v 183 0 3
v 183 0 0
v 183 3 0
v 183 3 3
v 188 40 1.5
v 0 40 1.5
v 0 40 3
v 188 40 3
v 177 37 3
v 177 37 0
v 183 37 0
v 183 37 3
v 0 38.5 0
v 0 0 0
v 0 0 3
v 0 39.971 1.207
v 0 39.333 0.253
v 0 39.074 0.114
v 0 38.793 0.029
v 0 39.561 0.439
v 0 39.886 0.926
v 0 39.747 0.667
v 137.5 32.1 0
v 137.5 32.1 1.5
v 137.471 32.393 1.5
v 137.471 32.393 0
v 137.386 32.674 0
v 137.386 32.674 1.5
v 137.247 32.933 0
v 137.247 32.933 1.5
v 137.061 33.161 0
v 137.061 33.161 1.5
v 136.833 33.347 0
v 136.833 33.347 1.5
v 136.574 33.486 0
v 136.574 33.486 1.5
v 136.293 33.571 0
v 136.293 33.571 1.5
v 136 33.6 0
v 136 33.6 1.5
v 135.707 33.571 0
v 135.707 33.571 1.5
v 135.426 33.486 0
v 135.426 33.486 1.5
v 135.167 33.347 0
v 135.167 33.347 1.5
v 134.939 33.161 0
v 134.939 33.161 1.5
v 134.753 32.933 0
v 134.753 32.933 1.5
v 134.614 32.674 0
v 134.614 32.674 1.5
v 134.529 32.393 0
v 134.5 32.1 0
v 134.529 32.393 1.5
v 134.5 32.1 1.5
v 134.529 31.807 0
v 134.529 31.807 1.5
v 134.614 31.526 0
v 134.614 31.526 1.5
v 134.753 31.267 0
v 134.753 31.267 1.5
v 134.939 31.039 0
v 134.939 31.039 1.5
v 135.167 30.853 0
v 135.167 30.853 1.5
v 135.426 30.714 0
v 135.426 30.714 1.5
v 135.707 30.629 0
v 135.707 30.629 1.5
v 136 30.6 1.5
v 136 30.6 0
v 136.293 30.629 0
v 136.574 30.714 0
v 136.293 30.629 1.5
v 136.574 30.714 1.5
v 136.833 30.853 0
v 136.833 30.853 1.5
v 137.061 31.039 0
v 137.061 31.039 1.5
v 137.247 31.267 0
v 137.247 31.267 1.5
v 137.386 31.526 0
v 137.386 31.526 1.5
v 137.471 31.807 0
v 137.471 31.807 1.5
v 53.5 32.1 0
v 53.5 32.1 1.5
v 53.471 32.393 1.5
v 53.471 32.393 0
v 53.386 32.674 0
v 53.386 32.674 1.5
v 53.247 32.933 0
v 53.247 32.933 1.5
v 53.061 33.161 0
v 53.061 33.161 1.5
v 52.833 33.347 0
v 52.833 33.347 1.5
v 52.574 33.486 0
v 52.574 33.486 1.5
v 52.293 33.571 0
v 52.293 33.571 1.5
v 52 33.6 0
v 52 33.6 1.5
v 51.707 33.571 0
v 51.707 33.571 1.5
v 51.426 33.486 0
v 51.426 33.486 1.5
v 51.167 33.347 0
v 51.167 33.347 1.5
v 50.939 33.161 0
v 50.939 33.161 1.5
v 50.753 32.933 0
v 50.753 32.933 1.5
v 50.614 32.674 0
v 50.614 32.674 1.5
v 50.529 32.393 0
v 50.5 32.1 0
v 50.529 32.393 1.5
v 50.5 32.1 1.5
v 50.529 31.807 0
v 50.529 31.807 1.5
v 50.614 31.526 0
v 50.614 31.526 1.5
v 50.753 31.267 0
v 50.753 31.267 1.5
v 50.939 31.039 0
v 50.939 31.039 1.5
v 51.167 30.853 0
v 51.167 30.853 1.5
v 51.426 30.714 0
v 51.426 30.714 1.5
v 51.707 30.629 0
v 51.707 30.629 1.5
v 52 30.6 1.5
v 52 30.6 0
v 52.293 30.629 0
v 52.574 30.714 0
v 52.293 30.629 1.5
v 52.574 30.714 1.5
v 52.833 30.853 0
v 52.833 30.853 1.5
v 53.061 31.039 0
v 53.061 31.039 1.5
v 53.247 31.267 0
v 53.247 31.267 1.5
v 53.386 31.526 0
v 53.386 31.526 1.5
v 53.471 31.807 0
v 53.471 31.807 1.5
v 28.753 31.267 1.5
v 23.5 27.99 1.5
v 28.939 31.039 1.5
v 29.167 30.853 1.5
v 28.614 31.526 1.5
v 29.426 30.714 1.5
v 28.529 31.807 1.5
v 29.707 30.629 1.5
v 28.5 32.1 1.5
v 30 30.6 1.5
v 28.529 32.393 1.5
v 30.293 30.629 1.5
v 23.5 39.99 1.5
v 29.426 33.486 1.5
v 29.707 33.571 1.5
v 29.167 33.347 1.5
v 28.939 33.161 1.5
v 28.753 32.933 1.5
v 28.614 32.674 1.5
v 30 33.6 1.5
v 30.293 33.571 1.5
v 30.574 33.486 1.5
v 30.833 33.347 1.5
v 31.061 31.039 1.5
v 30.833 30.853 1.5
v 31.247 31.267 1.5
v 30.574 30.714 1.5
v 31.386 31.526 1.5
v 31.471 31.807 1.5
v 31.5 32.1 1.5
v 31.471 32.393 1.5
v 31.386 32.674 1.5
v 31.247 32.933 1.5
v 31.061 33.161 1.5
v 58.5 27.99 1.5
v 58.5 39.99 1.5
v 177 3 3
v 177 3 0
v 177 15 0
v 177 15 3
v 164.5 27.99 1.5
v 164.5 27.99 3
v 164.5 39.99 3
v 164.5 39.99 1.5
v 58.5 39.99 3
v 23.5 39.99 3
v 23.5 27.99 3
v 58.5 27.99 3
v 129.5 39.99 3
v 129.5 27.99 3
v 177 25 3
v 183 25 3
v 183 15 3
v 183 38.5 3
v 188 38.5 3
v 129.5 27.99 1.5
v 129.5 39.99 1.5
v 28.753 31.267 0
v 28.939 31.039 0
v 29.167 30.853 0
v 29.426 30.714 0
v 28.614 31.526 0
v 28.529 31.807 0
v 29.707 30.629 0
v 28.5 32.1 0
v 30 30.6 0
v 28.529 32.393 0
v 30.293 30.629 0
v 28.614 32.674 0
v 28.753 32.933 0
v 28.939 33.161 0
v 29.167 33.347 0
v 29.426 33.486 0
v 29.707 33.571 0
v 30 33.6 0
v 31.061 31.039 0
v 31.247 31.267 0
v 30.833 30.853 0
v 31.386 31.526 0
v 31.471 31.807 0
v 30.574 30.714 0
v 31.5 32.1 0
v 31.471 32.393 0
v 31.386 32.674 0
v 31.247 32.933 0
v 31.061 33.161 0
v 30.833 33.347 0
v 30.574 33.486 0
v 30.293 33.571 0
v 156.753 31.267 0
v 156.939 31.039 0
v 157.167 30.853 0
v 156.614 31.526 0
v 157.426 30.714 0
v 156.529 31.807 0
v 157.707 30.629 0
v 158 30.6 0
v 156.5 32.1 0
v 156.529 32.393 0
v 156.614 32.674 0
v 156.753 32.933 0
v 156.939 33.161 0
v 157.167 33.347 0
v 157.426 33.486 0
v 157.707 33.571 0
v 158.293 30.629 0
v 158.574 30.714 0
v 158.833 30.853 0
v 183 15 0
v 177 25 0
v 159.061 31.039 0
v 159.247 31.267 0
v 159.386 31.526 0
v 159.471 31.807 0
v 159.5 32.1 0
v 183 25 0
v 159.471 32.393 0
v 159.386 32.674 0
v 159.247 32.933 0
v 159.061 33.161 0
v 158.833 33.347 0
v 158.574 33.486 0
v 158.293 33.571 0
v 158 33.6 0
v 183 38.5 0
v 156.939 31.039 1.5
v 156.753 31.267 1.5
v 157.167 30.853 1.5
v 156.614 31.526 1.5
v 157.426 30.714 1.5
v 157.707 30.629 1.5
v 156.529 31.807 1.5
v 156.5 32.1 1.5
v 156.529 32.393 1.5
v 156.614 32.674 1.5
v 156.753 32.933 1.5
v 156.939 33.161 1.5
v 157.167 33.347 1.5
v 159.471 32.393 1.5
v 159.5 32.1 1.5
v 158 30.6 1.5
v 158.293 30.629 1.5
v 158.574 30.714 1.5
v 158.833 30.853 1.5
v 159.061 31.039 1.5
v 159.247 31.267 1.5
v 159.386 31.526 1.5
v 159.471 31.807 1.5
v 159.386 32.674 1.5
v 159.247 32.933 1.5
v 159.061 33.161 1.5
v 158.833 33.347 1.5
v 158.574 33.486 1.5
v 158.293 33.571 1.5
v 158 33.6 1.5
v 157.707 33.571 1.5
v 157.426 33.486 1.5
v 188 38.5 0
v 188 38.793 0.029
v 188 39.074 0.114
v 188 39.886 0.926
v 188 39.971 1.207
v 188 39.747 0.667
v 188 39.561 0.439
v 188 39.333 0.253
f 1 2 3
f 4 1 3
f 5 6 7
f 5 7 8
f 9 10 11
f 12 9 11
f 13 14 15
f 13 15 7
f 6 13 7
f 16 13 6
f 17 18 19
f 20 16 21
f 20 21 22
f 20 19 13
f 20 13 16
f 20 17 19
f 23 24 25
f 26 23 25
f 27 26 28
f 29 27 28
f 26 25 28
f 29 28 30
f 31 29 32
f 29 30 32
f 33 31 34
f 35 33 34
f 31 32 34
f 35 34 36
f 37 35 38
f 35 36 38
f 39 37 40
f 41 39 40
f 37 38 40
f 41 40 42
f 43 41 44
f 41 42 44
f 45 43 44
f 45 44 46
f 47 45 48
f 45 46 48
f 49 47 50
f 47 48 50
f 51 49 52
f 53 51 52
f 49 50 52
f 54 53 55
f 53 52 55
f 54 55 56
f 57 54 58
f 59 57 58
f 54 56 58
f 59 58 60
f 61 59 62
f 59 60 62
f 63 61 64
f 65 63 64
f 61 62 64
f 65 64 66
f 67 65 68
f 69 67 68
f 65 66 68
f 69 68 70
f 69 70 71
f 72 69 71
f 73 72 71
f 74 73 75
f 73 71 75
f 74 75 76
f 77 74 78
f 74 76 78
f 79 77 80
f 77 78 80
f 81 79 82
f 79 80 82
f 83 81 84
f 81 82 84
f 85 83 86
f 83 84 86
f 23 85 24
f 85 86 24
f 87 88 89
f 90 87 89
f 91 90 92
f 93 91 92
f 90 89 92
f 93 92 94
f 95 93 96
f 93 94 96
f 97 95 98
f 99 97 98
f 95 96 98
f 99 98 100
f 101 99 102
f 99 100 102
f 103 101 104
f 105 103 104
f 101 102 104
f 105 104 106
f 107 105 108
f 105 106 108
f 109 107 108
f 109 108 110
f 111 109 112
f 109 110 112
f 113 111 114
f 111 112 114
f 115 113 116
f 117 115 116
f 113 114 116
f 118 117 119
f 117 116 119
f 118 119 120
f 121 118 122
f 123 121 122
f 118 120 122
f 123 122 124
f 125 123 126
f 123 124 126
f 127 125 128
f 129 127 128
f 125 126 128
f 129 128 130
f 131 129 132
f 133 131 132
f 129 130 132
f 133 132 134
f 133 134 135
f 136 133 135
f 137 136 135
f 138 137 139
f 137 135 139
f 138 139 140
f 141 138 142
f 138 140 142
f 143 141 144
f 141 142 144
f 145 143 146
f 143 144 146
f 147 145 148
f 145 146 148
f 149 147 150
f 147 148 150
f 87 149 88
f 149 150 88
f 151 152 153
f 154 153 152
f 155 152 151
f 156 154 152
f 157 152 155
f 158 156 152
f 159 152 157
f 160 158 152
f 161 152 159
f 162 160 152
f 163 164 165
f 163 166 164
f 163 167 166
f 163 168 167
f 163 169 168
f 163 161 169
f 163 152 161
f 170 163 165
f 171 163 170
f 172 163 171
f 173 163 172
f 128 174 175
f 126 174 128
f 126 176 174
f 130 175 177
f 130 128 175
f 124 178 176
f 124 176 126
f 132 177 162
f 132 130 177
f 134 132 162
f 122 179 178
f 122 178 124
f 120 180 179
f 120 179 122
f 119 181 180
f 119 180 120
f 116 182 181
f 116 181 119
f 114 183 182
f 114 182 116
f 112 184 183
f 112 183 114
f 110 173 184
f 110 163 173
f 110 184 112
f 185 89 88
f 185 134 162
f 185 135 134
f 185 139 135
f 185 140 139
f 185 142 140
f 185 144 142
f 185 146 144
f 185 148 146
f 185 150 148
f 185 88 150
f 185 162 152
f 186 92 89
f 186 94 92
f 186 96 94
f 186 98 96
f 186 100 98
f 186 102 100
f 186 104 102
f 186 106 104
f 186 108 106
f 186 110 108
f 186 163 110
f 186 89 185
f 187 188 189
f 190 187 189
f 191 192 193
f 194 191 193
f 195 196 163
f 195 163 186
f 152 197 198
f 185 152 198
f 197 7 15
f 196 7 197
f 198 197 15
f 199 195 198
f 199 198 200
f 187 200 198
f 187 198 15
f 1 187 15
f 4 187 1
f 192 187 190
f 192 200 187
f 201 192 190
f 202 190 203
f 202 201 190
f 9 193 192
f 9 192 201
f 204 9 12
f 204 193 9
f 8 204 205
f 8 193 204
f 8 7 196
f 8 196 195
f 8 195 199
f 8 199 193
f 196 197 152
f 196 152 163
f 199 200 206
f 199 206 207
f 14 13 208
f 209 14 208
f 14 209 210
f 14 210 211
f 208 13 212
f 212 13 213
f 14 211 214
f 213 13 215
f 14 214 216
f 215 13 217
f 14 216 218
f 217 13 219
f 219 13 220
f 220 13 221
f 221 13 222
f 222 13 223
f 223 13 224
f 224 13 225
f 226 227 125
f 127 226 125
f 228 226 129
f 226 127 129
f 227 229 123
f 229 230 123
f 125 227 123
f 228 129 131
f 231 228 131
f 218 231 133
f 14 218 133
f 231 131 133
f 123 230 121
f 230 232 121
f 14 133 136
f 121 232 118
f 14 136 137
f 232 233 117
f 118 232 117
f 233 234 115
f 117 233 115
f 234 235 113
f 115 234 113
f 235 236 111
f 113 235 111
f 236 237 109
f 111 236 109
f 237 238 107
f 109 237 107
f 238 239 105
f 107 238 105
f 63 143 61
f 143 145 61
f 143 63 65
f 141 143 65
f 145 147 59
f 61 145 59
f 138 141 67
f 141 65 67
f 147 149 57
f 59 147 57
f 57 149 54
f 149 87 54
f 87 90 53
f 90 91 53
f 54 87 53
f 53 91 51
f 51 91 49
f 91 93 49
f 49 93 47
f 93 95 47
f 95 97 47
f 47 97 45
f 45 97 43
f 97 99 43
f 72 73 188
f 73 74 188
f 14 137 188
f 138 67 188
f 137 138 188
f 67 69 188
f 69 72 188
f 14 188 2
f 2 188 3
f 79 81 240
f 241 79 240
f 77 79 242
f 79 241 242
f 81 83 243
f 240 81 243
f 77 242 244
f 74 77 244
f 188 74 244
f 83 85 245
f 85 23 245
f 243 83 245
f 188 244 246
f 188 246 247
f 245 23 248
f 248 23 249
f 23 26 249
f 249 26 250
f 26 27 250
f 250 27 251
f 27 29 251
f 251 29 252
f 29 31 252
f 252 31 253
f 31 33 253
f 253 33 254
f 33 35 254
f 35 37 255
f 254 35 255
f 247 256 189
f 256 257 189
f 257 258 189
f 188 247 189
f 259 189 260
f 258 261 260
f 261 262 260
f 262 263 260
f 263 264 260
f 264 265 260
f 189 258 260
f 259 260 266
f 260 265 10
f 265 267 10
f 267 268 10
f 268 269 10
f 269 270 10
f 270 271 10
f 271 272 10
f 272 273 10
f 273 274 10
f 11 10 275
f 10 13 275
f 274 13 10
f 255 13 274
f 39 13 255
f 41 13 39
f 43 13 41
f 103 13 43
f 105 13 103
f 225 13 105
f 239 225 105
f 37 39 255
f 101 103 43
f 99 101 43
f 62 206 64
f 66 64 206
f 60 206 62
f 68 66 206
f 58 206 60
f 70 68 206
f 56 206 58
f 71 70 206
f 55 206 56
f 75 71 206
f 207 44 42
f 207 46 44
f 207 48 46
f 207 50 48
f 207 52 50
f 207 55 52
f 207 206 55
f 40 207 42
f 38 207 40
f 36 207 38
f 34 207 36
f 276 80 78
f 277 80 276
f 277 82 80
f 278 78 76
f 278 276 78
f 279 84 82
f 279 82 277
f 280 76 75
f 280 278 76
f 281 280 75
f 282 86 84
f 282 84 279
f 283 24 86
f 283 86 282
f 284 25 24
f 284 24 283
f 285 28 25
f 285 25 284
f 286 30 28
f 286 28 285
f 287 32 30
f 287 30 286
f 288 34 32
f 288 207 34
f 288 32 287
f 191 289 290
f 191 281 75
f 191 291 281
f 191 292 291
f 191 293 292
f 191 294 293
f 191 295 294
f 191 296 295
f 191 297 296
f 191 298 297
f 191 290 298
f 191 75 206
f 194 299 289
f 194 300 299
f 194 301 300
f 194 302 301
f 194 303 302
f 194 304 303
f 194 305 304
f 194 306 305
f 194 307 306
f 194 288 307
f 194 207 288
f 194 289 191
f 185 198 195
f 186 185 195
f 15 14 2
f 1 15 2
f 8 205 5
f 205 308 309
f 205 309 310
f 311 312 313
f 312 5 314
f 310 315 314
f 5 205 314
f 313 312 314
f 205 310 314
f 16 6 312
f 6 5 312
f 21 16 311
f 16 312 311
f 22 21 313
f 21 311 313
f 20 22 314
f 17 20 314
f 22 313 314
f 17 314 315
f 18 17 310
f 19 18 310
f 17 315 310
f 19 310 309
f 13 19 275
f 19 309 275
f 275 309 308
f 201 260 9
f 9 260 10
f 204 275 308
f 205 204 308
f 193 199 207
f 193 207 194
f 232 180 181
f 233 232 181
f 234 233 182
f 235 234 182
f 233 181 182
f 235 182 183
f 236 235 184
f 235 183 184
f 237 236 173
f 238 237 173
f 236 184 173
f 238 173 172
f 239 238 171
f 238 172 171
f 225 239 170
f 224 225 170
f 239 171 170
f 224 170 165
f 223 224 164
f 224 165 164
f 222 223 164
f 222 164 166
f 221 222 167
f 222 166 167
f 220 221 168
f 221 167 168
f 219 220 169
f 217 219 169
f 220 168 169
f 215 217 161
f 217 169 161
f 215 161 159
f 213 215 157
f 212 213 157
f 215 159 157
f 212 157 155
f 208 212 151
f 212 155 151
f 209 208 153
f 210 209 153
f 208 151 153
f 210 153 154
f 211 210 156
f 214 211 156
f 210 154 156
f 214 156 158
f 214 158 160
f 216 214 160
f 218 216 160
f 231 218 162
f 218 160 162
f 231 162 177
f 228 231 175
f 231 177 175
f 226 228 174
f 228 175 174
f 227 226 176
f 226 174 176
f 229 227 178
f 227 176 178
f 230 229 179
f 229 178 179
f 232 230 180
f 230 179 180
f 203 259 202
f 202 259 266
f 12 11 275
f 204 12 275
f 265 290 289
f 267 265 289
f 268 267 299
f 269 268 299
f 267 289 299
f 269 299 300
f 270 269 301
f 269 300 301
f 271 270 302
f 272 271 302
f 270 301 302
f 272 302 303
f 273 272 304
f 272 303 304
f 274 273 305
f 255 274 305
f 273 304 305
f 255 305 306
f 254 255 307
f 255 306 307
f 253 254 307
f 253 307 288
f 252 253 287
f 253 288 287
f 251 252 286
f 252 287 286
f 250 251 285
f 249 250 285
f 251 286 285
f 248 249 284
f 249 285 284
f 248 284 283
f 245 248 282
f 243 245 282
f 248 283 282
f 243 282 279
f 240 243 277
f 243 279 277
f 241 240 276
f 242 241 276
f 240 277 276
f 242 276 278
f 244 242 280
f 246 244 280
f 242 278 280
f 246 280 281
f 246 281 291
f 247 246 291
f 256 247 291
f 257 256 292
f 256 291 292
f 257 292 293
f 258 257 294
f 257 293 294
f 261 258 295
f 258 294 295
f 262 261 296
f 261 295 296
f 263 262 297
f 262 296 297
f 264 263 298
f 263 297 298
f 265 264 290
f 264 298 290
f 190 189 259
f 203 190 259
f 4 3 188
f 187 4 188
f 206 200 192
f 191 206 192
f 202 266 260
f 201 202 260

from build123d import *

# Parameters (mm, degrees)
ESQUISSE1_W             = 188
ESQUISSE1_H             = 40
BOSS_EXTRU_1_DEPTH      = 3
CONG_3_R                = 1.5
ENL_V_MAT_EXTRU_1_DEPTH = 193.231631112
ESQUISSE5_W             = 35
ESQUISSE5_H             = 12
ENL_V_MAT_EXTRU_2_DEPTH = 1.5
ESQUISSE7_R             = 1.5
ENL_V_MAT_EXTRU_3_DEPTH = 1.5
ESQUISSE8_R             = 1.5
ENL_V_MAT_EXTRU_4_DEPTH = 1.5


with BuildPart() as part:
    # Esquisse1 → Boss.-Extru.1 (new body)
    with BuildSketch(Plane.XY):
        with Locations((94, 20)):
            Rectangle(ESQUISSE1_W, ESQUISSE1_H)
    extrude(amount=BOSS_EXTRU_1_DEPTH)

    # Congé3
    cong_3_edges = [part.edges().sort_by_distance(p)[0] for p in [
        (94, 40, 0),
    ]]
    fillet(cong_3_edges, radius=CONG_3_R)

    # Esquisse3 → Enlèv. mat.-Extru.1 (cut, through all)
    with BuildSketch(Plane(origin=(0, 0, 0), x_dir=(-1, 0, 0), z_dir=(0, 0, -1))):
        Polygon((-177, 37), (-183, 37), (-183, 38.5), (-188, 38.5), (-188, 0), (-183, 0), (-183, 3), (-177, 3), (-177, 15), (-183, 15), (-183, 25), (-177, 25), align=None)
    extrude(amount=-ENL_V_MAT_EXTRU_1_DEPTH, mode=Mode.SUBTRACT)

    # Esquisse5 → Enlèv. mat.-Extru.2 (cut)
    with BuildSketch(Plane.XY.offset(3)):
        with Locations((147, 33.99)):
            Rectangle(ESQUISSE5_W, ESQUISSE5_H)
        with Locations((41, 33.99)):
            Rectangle(ESQUISSE5_W, ESQUISSE5_H)
    extrude(amount=-ENL_V_MAT_EXTRU_2_DEPTH, mode=Mode.SUBTRACT)

    # Esquisse7 → Enlèv. mat.-Extru.3 (cut)
    with BuildSketch(Plane.XY.offset(1.5)):
        with Locations((30, 32.1)):
            Circle(ESQUISSE7_R)
        with Locations((52, 32.1)):
            Circle(ESQUISSE7_R)
    extrude(amount=-ENL_V_MAT_EXTRU_3_DEPTH, mode=Mode.SUBTRACT)

    # Esquisse8 → Enlèv. mat.-Extru.4 (cut)
    with BuildSketch(Plane.XY.offset(1.5)):
        with Locations((136, 32.1)):
            Circle(ESQUISSE8_R)
        with Locations((158, 32.1)):
            Circle(ESQUISSE8_R)
    extrude(amount=-ENL_V_MAT_EXTRU_4_DEPTH, mode=Mode.SUBTRACT)


solid = part.part
